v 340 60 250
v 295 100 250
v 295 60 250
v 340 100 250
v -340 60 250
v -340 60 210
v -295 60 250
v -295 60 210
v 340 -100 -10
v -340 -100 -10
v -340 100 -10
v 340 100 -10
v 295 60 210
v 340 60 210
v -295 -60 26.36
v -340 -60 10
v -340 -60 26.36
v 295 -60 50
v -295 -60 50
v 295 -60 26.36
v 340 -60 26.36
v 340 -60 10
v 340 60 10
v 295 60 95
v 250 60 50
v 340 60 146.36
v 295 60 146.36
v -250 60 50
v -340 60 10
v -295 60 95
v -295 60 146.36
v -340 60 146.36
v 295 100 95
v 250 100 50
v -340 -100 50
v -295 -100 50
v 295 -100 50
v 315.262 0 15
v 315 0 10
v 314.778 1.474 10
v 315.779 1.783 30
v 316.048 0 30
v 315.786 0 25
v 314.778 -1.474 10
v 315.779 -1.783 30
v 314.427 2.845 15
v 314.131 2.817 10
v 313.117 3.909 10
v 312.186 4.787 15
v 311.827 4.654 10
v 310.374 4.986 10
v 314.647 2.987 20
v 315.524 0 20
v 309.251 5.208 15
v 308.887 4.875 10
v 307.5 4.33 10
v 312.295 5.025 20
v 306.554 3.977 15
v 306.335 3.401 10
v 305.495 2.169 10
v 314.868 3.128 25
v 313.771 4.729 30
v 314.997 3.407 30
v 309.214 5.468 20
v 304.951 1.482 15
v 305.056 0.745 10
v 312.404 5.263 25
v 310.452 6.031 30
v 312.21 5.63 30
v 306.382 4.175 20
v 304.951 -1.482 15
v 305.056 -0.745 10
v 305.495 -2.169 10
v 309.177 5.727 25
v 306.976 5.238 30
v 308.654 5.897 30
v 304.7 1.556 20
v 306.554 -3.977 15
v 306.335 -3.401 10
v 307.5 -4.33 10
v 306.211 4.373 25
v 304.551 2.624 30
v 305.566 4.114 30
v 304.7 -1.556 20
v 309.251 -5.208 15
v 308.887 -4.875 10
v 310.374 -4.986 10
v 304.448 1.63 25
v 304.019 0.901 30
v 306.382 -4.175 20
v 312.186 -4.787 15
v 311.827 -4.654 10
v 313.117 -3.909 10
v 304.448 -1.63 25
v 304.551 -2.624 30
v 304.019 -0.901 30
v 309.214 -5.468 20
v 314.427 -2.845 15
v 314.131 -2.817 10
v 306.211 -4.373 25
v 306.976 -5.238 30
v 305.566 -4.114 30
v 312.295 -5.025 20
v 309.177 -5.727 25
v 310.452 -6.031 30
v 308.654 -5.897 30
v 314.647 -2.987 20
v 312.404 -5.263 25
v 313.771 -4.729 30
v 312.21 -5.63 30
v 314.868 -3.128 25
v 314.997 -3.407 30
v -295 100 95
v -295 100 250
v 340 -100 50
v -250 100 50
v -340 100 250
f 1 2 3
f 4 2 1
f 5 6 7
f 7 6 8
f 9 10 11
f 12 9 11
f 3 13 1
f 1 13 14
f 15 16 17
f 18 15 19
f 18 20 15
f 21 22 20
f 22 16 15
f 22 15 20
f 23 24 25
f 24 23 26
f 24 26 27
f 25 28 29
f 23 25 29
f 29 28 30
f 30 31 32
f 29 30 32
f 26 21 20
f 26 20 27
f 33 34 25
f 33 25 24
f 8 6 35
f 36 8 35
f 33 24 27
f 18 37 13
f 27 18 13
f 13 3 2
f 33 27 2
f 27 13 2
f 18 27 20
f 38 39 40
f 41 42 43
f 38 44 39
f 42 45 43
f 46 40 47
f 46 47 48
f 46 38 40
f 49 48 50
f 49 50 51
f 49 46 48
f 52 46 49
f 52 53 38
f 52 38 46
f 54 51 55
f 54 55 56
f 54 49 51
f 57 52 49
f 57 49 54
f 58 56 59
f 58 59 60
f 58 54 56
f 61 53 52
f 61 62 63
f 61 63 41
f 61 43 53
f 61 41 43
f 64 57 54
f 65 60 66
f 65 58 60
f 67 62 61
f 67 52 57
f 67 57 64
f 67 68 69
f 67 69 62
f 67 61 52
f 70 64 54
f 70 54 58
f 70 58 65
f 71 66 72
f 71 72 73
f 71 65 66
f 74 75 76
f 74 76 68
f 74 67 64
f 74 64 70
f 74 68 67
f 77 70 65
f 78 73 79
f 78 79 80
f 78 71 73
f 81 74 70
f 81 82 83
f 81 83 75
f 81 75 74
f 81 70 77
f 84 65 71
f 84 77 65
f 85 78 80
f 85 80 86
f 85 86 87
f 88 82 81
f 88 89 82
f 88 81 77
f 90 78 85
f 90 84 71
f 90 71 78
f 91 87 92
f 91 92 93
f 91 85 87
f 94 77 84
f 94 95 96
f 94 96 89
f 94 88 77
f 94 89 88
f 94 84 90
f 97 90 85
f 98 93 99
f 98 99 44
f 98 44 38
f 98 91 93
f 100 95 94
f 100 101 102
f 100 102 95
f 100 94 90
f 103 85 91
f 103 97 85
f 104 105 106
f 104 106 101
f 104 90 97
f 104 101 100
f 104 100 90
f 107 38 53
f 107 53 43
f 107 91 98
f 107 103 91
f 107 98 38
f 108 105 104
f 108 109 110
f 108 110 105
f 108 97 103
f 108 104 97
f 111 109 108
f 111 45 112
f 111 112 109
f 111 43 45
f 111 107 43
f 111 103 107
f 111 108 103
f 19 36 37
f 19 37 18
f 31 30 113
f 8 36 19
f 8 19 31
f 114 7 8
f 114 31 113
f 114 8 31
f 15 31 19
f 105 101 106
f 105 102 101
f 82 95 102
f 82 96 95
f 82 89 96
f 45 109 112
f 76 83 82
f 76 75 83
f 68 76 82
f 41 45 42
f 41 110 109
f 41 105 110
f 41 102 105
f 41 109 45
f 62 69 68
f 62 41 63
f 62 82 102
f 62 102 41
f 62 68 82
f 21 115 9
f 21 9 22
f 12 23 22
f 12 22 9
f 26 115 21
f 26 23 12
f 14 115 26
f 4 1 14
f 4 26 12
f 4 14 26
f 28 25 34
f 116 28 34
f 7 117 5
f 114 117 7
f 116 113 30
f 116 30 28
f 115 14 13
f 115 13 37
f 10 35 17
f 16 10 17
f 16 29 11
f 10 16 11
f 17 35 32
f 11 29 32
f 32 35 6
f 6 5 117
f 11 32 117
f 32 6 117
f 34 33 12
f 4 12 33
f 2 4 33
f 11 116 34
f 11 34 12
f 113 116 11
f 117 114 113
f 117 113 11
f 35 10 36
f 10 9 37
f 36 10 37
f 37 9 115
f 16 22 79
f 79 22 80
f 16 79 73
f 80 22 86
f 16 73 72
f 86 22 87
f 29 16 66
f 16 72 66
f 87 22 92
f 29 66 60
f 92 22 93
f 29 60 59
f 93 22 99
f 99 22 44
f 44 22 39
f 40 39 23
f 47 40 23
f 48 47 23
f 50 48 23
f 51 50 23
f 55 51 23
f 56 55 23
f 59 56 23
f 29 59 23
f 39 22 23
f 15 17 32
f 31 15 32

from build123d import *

# Parameters (mm, degrees)
F0_W      = 200
F0_H      = 20
F1_DEPTH  = 340
F2_W      = 40
F2_H      = 40
F3_DEPTH  = 340
F4_W      = 45
F4_H      = 40
F5_DEPTH  = 200
F7_DEPTH  = 45
F9_DEPTH  = 40
F10_R     = 5
F11_DEPTH = 20
F11_TAPER = -3


# Not quite as in the source:
# - a pattern or mirror of a feature is missing from the dataset's text; its kind, count and spacing are read off the source's solid


with BuildPart() as f1:
    # F0 (on Right) → F1 (new body, symmetric)
    with BuildSketch(Plane.YZ):
        Rectangle(F0_W, F0_H)
    extrude(amount=F1_DEPTH, both=True)

    # F2 (on Right) → F3 (join, symmetric)
    with BuildSketch(Plane.YZ):
        with Locations((80, 30)):
            Rectangle(F2_W, F2_H)
        with Locations((-80, 30)):
            Rectangle(F2_W, F2_H)
    extrude(amount=F3_DEPTH, both=True)

    # F4 (on face) → F5 (join)
    with BuildSketch(Plane.XY.offset(50)):
        with Locations((-317.5, 80)):
            Rectangle(F4_W, F4_H)
        with Locations((317.5, 80)):
            Rectangle(F4_W, F4_H)
    extrude(amount=F5_DEPTH)

    # F6 (on face) → F7 (join)
    with BuildSketch(Plane.YZ.offset(340)):
        Polygon((60, 210), (-100, 50), (-60, 50), (-60, 26.3603896932), (60, 146.3603896932), align=None)
    f7 = extrude(amount=-F7_DEPTH)

    # F7_copies: F7 across plane
    add(f7.mirror(Plane(origin=(0, 0, 0), x_dir=(0, 0, -1), z_dir=(-1, 0, 0))))

    # F8 (on face) → F9 (join)
    with BuildSketch(Plane(origin=(0, 100, 0), x_dir=(-1, 0, 0), z_dir=(0, 1, 0))):
        Polygon((-250, 50), (-295, 95), (-295, 50), align=None)
        Polygon((295, 50), (295, 95), (250, 50), align=None)
    extrude(amount=-F9_DEPTH)

    # F10 (on face) → F11 (join)
    with BuildSketch(Plane.XY.offset(10)):
        with Locations((310, 0)):
            Circle(F10_R)
    extrude(amount=F11_DEPTH, taper=F11_TAPER)


solid = f1.part
